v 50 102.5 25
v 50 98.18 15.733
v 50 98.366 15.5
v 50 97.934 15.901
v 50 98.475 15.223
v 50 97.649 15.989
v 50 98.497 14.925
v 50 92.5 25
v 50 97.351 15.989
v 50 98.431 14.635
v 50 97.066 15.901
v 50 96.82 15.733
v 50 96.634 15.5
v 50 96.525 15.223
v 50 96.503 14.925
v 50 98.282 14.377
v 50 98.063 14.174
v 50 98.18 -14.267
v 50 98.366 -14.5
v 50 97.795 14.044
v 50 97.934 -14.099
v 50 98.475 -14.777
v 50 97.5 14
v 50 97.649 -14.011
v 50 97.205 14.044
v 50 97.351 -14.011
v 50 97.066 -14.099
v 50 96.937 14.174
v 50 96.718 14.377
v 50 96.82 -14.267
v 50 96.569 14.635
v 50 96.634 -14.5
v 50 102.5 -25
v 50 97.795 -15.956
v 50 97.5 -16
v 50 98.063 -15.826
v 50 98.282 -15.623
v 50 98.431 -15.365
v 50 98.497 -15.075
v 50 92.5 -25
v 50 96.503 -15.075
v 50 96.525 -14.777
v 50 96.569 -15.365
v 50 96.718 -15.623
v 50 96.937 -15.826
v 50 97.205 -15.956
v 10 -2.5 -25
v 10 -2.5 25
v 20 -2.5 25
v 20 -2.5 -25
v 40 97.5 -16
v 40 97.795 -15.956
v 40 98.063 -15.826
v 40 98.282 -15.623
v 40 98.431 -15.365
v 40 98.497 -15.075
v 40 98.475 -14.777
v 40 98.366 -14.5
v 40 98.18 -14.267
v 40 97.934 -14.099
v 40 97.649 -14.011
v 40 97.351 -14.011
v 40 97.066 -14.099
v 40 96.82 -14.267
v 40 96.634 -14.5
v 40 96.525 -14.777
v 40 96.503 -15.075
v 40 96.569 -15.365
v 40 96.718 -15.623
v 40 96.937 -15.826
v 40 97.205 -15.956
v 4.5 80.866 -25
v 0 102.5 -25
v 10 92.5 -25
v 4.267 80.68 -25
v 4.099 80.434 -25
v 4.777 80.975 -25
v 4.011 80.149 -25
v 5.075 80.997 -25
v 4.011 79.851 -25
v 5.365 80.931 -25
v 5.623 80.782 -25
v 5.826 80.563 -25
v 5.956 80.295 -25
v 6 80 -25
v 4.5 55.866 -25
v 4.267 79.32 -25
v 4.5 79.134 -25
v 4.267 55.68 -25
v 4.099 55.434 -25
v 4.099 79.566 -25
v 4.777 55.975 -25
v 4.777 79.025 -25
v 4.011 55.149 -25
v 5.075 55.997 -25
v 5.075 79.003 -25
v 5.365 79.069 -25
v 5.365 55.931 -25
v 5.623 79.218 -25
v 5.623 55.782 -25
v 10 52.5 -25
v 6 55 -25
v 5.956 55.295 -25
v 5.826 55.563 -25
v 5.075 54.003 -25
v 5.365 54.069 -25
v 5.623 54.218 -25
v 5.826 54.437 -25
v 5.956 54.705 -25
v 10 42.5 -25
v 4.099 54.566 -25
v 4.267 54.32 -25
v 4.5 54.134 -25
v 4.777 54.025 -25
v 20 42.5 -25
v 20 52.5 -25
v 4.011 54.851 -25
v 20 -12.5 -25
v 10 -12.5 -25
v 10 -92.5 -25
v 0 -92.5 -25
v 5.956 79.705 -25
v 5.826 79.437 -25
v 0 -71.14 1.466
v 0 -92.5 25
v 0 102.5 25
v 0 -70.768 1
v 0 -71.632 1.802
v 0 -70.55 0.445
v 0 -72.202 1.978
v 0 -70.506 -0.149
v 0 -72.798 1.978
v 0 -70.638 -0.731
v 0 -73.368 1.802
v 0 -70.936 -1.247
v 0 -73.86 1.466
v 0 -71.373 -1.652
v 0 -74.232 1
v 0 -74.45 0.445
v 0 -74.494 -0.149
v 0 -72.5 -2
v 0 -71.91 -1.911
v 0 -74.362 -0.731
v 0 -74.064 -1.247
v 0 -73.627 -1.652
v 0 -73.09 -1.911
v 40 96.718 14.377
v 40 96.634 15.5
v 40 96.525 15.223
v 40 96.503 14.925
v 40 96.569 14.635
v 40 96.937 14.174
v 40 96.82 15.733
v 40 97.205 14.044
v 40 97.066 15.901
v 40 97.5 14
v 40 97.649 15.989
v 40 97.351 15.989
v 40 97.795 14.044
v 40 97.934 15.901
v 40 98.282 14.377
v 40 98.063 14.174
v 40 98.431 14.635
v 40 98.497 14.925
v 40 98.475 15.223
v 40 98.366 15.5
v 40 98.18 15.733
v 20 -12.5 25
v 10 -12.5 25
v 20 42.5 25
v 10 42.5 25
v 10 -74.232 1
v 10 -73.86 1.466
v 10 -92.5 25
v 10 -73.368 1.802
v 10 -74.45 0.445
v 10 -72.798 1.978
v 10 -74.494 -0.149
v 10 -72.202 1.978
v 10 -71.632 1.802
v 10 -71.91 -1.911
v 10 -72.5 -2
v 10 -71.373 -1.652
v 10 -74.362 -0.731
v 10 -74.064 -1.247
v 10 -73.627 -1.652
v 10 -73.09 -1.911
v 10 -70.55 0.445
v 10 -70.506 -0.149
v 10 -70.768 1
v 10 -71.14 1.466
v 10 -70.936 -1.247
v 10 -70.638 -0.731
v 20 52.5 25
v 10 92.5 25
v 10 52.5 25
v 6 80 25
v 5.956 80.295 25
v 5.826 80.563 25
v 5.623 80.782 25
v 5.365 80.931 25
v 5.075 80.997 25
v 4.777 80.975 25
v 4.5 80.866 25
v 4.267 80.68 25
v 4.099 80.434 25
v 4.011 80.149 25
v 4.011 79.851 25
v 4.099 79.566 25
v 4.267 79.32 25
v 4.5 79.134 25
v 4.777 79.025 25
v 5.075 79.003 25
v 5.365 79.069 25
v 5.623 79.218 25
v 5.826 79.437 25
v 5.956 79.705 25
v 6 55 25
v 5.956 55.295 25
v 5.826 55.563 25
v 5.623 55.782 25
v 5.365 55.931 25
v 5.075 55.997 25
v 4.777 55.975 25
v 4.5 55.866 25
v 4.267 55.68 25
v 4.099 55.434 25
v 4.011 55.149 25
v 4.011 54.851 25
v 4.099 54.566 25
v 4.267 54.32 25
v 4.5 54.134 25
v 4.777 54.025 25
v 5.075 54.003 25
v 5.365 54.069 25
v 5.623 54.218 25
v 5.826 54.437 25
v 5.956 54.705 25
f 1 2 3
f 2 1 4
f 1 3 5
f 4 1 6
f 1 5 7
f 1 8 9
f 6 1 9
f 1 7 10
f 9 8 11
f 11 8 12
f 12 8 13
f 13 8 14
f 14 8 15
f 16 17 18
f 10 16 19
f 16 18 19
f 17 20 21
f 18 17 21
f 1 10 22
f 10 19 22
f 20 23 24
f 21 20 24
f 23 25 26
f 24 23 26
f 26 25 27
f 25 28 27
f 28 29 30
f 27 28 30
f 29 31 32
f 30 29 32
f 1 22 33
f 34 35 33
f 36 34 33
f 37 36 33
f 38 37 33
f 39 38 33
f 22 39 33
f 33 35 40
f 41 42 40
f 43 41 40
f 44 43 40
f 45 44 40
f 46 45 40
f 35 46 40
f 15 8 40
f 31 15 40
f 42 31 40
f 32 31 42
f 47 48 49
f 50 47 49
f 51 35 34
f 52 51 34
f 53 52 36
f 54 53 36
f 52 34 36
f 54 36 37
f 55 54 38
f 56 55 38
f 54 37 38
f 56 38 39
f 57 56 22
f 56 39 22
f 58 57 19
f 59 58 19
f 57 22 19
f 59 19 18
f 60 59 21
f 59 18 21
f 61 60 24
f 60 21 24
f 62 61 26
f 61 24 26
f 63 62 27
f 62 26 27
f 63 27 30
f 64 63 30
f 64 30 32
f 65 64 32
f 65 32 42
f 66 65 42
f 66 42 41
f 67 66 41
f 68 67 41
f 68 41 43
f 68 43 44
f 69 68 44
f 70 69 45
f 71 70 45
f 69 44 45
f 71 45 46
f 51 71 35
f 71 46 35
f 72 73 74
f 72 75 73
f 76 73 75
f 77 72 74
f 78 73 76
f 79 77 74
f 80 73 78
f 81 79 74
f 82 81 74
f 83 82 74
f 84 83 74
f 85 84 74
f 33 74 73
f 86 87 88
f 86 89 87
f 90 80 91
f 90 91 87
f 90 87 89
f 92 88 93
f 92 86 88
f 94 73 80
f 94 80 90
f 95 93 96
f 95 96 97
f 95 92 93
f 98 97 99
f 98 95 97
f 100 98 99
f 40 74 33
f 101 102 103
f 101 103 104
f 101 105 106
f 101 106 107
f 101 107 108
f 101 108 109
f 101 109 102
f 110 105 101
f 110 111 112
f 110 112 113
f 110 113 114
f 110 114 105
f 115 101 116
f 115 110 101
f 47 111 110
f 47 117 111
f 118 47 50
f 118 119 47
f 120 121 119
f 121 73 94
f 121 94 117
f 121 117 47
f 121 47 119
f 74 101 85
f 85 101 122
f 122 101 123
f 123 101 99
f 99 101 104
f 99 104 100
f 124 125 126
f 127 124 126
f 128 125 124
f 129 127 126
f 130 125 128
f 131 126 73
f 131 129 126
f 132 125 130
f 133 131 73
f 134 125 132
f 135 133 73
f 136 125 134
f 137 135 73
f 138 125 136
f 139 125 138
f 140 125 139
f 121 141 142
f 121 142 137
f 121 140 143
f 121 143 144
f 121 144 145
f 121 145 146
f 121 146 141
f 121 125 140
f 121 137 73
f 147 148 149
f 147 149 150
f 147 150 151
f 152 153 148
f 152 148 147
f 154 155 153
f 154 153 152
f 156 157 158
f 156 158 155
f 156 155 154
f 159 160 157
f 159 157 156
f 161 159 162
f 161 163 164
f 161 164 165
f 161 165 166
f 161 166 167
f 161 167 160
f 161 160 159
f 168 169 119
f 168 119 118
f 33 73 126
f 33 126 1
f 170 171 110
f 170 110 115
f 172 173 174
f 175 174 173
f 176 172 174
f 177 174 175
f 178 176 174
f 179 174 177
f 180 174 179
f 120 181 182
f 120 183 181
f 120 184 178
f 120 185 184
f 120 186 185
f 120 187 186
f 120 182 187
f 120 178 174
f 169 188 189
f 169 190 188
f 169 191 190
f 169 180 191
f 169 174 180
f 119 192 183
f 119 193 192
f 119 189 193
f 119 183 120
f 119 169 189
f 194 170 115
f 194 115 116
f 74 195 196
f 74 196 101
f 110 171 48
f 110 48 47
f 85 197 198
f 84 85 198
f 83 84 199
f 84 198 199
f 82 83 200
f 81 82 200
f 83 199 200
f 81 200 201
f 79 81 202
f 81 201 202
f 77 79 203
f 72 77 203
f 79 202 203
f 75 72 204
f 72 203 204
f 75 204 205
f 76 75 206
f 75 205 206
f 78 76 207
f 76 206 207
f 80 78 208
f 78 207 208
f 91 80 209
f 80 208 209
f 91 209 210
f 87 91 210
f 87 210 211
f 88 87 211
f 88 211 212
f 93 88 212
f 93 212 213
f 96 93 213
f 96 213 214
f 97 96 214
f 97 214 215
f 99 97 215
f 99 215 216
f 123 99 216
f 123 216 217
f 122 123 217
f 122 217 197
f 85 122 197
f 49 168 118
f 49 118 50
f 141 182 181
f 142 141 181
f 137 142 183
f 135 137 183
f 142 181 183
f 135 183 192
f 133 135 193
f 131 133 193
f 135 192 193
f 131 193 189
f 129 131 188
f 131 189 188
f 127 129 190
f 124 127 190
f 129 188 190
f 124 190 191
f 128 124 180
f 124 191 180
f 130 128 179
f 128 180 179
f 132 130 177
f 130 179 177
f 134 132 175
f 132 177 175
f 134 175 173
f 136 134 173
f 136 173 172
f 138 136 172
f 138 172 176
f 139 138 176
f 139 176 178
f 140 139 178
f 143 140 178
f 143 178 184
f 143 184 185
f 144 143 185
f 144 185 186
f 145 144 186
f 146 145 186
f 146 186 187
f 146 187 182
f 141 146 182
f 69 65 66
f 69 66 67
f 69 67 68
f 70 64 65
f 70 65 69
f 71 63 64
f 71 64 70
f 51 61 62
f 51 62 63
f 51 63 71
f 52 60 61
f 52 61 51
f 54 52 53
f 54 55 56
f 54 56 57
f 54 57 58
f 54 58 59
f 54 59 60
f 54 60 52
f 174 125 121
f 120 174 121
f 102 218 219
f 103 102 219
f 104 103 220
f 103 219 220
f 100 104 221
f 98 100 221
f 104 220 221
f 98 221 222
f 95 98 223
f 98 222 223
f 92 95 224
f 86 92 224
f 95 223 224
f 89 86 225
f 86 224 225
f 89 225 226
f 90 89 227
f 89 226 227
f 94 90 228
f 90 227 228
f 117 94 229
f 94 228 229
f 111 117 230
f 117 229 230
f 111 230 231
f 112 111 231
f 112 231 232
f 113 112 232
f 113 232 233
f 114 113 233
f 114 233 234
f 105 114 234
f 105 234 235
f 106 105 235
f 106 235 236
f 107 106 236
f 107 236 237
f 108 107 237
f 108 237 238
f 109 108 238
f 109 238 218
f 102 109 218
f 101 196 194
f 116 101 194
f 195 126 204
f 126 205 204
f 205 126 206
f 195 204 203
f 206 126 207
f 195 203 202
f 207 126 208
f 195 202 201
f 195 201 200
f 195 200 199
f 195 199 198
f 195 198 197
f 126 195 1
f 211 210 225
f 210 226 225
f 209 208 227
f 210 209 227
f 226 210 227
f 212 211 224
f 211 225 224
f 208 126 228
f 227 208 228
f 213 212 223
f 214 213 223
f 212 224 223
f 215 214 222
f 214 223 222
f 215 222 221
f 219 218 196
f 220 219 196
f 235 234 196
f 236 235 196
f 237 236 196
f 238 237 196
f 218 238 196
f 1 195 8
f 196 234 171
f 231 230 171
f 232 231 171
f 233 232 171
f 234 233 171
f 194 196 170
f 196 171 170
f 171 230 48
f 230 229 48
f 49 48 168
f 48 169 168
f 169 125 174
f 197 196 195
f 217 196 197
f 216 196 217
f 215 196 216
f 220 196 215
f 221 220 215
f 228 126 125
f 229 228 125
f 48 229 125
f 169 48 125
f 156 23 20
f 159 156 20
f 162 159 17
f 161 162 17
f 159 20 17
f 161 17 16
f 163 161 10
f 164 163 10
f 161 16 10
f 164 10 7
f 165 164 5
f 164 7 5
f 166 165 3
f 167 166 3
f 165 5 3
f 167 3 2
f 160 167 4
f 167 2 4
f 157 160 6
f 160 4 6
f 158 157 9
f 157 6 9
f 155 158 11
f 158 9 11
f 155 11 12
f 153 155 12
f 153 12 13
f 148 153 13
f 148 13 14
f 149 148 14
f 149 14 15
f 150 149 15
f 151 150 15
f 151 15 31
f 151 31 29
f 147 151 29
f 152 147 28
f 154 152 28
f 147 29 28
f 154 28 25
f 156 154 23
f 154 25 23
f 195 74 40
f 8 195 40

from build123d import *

# Parameters (mm, degrees)
SKIZZE1_W                       = 50
SKIZZE1_H                       = 185
AUFSATZ_LINEAR_AUSTRAGEN1_DEPTH = 10
SKIZZE3_W                       = 10
SKIZZE3_H                       = 10
AUFSATZ_LINEAR_AUSTRAGEN3_DEPTH = 50
SKIZZE4_R                       = 2
SCHNITT_LINEAR_AUSTRAGEN1_DEPTH = 97.33924434
SKIZZE6_W                       = 50
SKIZZE6_H                       = 50
AUFSATZ_LINEAR_AUSTRAGEN4_DEPTH = 10
SKIZZE7_R                       = 1
SCHNITT_LINEAR_AUSTRAGEN2_DEPTH = 125.524094054
SKIZZE8_R                       = 1
SCHNITT_LINEAR_AUSTRAGEN3_DEPTH = 10


with BuildPart() as part:
    # Skizze1 → Aufsatz-Linear austragen1 (new body)
    with BuildSketch(Plane(origin=(0, 0, 0), x_dir=(0, 0, -1), z_dir=(1, 0, 0))):
        Rectangle(SKIZZE1_W, SKIZZE1_H)
    extrude(amount=AUFSATZ_LINEAR_AUSTRAGEN1_DEPTH)

    # Skizze3 → Aufsatz-Linear austragen3 (add)
    with BuildSketch(Plane.XY.offset(25)):
        with Locations((15, 47.5)):
            Rectangle(SKIZZE3_W, SKIZZE3_H)
        with Locations((15, -7.5)):
            Rectangle(SKIZZE3_W, SKIZZE3_H)
    extrude(amount=-AUFSATZ_LINEAR_AUSTRAGEN3_DEPTH)

    # Skizze4 → Schnitt-Linear austragen1 (cut, through all)
    with BuildSketch(Plane(origin=(10, 0, 0), x_dir=(0, 0, -1), z_dir=(1, 0, 0))):
        with Locations((0, -72.5)):
            Circle(SKIZZE4_R)
    extrude(amount=-SCHNITT_LINEAR_AUSTRAGEN1_DEPTH, mode=Mode.SUBTRACT)

    # Skizze6 → Aufsatz-Linear austragen4 (add)
    with BuildSketch(Plane(origin=(0, 92.5, 0), x_dir=(1, 0, 0), z_dir=(0, 1, 0))):
        with Locations((25, 0)):
            Rectangle(SKIZZE6_W, SKIZZE6_H)
    extrude(amount=AUFSATZ_LINEAR_AUSTRAGEN4_DEPTH)

    # Skizze7 → Schnitt-Linear austragen2 (cut, through all)
    with BuildSketch(Plane.XY.offset(25)):
        with Locations((5, 80)):
            Circle(SKIZZE7_R)
        with Locations((5, 55)):
            Circle(SKIZZE7_R)
    extrude(amount=-SCHNITT_LINEAR_AUSTRAGEN2_DEPTH, mode=Mode.SUBTRACT)

    # Skizze8 → Schnitt-Linear austragen3 (cut)
    with BuildSketch(Plane(origin=(50, 0, 0), x_dir=(0, 0, -1), z_dir=(1, 0, 0))):
        with Locations((-15, 97.5)):
            Circle(SKIZZE8_R)
        with Locations((15, 97.5)):
            Circle(SKIZZE8_R)
    extrude(amount=-SCHNITT_LINEAR_AUSTRAGEN3_DEPTH, mode=Mode.SUBTRACT)


solid = part.part
